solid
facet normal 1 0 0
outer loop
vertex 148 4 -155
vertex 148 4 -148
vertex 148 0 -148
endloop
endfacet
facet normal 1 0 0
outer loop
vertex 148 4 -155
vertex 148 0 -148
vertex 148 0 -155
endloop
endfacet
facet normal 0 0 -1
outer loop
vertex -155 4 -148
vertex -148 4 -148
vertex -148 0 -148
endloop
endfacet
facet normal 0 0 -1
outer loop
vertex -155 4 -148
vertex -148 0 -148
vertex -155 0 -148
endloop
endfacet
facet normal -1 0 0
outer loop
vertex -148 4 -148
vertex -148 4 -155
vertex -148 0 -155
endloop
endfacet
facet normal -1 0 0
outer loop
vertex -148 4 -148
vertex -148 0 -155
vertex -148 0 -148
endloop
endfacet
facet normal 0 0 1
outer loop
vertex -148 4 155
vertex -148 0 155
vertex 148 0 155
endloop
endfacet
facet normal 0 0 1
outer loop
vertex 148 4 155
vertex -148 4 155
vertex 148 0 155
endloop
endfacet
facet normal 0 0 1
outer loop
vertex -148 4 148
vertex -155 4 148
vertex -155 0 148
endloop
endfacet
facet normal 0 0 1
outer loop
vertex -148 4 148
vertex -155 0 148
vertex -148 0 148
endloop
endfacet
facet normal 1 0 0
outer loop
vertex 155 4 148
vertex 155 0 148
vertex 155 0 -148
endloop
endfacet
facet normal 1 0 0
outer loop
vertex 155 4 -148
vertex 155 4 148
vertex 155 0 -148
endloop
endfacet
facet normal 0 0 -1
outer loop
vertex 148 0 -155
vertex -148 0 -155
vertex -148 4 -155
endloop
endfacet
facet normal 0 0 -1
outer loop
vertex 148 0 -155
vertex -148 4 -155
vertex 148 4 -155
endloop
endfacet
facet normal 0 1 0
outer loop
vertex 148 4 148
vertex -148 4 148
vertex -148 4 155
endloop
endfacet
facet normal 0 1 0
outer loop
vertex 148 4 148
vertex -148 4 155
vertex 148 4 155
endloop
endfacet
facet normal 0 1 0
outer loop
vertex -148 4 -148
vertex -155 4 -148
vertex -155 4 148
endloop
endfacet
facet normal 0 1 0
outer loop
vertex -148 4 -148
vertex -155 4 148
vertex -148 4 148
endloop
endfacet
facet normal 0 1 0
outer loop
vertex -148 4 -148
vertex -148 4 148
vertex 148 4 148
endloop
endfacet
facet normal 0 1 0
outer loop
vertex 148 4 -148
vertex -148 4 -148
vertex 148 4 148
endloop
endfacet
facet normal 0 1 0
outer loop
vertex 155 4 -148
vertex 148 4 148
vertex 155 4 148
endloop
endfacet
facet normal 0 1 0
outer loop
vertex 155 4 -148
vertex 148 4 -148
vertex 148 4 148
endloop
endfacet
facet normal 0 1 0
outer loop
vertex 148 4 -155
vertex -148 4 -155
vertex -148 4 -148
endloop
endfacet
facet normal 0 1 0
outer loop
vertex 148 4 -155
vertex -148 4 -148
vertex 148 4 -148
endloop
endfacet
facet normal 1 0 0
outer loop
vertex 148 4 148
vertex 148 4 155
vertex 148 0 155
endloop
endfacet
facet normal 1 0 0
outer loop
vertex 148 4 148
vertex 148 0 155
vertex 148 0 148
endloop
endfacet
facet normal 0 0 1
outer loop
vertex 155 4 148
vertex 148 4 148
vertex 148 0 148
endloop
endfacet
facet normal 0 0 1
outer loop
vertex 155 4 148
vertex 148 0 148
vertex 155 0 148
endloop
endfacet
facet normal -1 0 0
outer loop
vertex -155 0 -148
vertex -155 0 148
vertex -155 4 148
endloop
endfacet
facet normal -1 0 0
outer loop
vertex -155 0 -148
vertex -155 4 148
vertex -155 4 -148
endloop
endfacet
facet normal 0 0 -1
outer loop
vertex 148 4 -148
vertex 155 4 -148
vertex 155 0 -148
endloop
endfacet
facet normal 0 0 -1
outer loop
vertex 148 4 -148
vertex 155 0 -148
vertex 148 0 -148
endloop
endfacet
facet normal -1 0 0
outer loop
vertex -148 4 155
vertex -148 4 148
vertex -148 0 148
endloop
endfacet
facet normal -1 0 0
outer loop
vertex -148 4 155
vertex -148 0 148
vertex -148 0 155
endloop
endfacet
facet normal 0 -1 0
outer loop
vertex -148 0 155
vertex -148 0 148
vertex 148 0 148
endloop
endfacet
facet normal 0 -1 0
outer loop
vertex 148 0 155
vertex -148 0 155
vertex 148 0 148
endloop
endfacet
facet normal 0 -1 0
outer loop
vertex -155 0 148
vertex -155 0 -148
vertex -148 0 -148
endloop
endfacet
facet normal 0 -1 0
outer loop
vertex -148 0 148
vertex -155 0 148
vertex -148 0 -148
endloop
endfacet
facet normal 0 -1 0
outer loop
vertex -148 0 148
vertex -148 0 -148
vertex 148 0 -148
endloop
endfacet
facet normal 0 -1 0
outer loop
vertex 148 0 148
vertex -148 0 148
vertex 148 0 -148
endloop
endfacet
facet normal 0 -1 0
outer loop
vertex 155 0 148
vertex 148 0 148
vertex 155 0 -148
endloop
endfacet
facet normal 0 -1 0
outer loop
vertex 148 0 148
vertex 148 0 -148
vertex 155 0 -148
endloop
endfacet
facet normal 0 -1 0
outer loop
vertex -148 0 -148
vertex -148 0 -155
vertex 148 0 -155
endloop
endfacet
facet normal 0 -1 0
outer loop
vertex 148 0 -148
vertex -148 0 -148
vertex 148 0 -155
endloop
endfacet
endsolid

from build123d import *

# Parameters (mm, degrees)
SKETCH_1_W               = 310
SKETCH_1_H               = 310
EXTRUDE_1_DEPTH          = 4
SKETCH_2_W               = 7
SKETCH_2_H               = 7
CUT_EXTRUDE_1_DEPTH      = 6
PATTERN_CIRCULAR_1_COUNT = 4


with BuildPart() as part:
    # 草图1 → 凸台-拉伸1 (new body)
    with BuildSketch(Plane(origin=(0, 0, 0), x_dir=(1, 0, 0), z_dir=(0, 1, 0))):
        Rectangle(SKETCH_1_W, SKETCH_1_H)
    extrude(amount=EXTRUDE_1_DEPTH)

    # 草图2 → 切除-拉伸1 (cut)
    with BuildSketch(Plane(origin=(0, 4, 0), x_dir=(1, 0, 0), z_dir=(0, 1, 0))):
        with Locations((151.5, -151.5)):
            Rectangle(SKETCH_2_W, SKETCH_2_H)
    cut_extrude_1 = extrude(amount=-CUT_EXTRUDE_1_DEPTH, mode=Mode.SUBTRACT)

    # 阵列(圆周)1: 切除-拉伸1 ×4 about axis
    pattern_circular_1_axis = Axis((0, 0, 0), (0, 1, 0))
    for i in range(1, PATTERN_CIRCULAR_1_COUNT):
        add(cut_extrude_1.rotate(pattern_circular_1_axis, i * 360 / PATTERN_CIRCULAR_1_COUNT), mode=Mode.SUBTRACT)


solid = part.part
